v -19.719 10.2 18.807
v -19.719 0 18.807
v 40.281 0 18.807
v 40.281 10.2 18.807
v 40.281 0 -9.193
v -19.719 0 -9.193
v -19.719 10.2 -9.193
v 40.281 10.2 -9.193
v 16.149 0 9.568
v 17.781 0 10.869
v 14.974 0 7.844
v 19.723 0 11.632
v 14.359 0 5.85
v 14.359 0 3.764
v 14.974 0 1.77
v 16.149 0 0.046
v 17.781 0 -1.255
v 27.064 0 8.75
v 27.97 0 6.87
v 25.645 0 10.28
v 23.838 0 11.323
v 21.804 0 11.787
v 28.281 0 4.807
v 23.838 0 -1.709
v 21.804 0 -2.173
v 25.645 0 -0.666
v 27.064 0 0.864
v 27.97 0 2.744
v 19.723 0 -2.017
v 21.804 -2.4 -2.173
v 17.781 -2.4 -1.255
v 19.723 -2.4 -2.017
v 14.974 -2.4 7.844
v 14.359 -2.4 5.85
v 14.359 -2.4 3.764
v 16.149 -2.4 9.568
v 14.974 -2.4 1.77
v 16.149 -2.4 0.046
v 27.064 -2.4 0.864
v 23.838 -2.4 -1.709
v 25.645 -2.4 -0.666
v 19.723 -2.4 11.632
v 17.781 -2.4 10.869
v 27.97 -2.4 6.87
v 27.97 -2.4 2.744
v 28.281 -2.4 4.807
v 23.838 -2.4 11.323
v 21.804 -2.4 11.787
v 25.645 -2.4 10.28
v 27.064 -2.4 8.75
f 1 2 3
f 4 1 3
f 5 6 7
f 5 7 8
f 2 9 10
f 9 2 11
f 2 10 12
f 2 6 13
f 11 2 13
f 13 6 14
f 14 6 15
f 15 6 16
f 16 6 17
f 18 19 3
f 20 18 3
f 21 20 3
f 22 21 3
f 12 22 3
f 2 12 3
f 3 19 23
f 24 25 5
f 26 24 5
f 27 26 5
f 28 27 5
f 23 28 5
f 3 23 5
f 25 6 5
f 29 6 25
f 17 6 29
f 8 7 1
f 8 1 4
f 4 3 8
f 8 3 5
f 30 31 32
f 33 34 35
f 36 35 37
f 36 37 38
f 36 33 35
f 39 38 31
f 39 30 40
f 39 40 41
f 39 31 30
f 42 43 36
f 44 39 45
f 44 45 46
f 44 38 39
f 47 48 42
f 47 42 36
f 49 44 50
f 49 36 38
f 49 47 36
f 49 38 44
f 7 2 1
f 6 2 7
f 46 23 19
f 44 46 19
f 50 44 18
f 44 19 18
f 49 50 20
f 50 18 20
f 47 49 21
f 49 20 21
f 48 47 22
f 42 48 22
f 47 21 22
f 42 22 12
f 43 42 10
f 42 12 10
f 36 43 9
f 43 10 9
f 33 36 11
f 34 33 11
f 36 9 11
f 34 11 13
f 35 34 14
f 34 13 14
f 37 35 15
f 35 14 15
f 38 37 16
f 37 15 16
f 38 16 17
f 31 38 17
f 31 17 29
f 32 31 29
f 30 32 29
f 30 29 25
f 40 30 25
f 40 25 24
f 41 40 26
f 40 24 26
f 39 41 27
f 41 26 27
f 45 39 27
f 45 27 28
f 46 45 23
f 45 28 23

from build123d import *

# Parameters (mm, degrees)
SKETCH_2_W      = 60
SKETCH_2_H      = 28
EXTRUDE_1_DEPTH = 10.2
SKETCH_3_R      = 7
EXTRUDE_2_DEPTH = 2.4


with BuildPart() as part:
    # 草图2 → 凸台-拉伸1 (new body)
    with BuildSketch(Plane(origin=(0, 0, 0), x_dir=(1, 0, 0), z_dir=(0, 1, 0))):
        with Locations((10.280701754, -4.807017544)):
            Rectangle(SKETCH_2_W, SKETCH_2_H)
    extrude(amount=EXTRUDE_1_DEPTH)

    # 草图3 → 凸台-拉伸2 (add)
    with BuildSketch(Plane.XZ):
        with Locations((21.280701754, 4.807017544)):
            Circle(SKETCH_3_R)
    extrude(amount=EXTRUDE_2_DEPTH)


solid = part.part
